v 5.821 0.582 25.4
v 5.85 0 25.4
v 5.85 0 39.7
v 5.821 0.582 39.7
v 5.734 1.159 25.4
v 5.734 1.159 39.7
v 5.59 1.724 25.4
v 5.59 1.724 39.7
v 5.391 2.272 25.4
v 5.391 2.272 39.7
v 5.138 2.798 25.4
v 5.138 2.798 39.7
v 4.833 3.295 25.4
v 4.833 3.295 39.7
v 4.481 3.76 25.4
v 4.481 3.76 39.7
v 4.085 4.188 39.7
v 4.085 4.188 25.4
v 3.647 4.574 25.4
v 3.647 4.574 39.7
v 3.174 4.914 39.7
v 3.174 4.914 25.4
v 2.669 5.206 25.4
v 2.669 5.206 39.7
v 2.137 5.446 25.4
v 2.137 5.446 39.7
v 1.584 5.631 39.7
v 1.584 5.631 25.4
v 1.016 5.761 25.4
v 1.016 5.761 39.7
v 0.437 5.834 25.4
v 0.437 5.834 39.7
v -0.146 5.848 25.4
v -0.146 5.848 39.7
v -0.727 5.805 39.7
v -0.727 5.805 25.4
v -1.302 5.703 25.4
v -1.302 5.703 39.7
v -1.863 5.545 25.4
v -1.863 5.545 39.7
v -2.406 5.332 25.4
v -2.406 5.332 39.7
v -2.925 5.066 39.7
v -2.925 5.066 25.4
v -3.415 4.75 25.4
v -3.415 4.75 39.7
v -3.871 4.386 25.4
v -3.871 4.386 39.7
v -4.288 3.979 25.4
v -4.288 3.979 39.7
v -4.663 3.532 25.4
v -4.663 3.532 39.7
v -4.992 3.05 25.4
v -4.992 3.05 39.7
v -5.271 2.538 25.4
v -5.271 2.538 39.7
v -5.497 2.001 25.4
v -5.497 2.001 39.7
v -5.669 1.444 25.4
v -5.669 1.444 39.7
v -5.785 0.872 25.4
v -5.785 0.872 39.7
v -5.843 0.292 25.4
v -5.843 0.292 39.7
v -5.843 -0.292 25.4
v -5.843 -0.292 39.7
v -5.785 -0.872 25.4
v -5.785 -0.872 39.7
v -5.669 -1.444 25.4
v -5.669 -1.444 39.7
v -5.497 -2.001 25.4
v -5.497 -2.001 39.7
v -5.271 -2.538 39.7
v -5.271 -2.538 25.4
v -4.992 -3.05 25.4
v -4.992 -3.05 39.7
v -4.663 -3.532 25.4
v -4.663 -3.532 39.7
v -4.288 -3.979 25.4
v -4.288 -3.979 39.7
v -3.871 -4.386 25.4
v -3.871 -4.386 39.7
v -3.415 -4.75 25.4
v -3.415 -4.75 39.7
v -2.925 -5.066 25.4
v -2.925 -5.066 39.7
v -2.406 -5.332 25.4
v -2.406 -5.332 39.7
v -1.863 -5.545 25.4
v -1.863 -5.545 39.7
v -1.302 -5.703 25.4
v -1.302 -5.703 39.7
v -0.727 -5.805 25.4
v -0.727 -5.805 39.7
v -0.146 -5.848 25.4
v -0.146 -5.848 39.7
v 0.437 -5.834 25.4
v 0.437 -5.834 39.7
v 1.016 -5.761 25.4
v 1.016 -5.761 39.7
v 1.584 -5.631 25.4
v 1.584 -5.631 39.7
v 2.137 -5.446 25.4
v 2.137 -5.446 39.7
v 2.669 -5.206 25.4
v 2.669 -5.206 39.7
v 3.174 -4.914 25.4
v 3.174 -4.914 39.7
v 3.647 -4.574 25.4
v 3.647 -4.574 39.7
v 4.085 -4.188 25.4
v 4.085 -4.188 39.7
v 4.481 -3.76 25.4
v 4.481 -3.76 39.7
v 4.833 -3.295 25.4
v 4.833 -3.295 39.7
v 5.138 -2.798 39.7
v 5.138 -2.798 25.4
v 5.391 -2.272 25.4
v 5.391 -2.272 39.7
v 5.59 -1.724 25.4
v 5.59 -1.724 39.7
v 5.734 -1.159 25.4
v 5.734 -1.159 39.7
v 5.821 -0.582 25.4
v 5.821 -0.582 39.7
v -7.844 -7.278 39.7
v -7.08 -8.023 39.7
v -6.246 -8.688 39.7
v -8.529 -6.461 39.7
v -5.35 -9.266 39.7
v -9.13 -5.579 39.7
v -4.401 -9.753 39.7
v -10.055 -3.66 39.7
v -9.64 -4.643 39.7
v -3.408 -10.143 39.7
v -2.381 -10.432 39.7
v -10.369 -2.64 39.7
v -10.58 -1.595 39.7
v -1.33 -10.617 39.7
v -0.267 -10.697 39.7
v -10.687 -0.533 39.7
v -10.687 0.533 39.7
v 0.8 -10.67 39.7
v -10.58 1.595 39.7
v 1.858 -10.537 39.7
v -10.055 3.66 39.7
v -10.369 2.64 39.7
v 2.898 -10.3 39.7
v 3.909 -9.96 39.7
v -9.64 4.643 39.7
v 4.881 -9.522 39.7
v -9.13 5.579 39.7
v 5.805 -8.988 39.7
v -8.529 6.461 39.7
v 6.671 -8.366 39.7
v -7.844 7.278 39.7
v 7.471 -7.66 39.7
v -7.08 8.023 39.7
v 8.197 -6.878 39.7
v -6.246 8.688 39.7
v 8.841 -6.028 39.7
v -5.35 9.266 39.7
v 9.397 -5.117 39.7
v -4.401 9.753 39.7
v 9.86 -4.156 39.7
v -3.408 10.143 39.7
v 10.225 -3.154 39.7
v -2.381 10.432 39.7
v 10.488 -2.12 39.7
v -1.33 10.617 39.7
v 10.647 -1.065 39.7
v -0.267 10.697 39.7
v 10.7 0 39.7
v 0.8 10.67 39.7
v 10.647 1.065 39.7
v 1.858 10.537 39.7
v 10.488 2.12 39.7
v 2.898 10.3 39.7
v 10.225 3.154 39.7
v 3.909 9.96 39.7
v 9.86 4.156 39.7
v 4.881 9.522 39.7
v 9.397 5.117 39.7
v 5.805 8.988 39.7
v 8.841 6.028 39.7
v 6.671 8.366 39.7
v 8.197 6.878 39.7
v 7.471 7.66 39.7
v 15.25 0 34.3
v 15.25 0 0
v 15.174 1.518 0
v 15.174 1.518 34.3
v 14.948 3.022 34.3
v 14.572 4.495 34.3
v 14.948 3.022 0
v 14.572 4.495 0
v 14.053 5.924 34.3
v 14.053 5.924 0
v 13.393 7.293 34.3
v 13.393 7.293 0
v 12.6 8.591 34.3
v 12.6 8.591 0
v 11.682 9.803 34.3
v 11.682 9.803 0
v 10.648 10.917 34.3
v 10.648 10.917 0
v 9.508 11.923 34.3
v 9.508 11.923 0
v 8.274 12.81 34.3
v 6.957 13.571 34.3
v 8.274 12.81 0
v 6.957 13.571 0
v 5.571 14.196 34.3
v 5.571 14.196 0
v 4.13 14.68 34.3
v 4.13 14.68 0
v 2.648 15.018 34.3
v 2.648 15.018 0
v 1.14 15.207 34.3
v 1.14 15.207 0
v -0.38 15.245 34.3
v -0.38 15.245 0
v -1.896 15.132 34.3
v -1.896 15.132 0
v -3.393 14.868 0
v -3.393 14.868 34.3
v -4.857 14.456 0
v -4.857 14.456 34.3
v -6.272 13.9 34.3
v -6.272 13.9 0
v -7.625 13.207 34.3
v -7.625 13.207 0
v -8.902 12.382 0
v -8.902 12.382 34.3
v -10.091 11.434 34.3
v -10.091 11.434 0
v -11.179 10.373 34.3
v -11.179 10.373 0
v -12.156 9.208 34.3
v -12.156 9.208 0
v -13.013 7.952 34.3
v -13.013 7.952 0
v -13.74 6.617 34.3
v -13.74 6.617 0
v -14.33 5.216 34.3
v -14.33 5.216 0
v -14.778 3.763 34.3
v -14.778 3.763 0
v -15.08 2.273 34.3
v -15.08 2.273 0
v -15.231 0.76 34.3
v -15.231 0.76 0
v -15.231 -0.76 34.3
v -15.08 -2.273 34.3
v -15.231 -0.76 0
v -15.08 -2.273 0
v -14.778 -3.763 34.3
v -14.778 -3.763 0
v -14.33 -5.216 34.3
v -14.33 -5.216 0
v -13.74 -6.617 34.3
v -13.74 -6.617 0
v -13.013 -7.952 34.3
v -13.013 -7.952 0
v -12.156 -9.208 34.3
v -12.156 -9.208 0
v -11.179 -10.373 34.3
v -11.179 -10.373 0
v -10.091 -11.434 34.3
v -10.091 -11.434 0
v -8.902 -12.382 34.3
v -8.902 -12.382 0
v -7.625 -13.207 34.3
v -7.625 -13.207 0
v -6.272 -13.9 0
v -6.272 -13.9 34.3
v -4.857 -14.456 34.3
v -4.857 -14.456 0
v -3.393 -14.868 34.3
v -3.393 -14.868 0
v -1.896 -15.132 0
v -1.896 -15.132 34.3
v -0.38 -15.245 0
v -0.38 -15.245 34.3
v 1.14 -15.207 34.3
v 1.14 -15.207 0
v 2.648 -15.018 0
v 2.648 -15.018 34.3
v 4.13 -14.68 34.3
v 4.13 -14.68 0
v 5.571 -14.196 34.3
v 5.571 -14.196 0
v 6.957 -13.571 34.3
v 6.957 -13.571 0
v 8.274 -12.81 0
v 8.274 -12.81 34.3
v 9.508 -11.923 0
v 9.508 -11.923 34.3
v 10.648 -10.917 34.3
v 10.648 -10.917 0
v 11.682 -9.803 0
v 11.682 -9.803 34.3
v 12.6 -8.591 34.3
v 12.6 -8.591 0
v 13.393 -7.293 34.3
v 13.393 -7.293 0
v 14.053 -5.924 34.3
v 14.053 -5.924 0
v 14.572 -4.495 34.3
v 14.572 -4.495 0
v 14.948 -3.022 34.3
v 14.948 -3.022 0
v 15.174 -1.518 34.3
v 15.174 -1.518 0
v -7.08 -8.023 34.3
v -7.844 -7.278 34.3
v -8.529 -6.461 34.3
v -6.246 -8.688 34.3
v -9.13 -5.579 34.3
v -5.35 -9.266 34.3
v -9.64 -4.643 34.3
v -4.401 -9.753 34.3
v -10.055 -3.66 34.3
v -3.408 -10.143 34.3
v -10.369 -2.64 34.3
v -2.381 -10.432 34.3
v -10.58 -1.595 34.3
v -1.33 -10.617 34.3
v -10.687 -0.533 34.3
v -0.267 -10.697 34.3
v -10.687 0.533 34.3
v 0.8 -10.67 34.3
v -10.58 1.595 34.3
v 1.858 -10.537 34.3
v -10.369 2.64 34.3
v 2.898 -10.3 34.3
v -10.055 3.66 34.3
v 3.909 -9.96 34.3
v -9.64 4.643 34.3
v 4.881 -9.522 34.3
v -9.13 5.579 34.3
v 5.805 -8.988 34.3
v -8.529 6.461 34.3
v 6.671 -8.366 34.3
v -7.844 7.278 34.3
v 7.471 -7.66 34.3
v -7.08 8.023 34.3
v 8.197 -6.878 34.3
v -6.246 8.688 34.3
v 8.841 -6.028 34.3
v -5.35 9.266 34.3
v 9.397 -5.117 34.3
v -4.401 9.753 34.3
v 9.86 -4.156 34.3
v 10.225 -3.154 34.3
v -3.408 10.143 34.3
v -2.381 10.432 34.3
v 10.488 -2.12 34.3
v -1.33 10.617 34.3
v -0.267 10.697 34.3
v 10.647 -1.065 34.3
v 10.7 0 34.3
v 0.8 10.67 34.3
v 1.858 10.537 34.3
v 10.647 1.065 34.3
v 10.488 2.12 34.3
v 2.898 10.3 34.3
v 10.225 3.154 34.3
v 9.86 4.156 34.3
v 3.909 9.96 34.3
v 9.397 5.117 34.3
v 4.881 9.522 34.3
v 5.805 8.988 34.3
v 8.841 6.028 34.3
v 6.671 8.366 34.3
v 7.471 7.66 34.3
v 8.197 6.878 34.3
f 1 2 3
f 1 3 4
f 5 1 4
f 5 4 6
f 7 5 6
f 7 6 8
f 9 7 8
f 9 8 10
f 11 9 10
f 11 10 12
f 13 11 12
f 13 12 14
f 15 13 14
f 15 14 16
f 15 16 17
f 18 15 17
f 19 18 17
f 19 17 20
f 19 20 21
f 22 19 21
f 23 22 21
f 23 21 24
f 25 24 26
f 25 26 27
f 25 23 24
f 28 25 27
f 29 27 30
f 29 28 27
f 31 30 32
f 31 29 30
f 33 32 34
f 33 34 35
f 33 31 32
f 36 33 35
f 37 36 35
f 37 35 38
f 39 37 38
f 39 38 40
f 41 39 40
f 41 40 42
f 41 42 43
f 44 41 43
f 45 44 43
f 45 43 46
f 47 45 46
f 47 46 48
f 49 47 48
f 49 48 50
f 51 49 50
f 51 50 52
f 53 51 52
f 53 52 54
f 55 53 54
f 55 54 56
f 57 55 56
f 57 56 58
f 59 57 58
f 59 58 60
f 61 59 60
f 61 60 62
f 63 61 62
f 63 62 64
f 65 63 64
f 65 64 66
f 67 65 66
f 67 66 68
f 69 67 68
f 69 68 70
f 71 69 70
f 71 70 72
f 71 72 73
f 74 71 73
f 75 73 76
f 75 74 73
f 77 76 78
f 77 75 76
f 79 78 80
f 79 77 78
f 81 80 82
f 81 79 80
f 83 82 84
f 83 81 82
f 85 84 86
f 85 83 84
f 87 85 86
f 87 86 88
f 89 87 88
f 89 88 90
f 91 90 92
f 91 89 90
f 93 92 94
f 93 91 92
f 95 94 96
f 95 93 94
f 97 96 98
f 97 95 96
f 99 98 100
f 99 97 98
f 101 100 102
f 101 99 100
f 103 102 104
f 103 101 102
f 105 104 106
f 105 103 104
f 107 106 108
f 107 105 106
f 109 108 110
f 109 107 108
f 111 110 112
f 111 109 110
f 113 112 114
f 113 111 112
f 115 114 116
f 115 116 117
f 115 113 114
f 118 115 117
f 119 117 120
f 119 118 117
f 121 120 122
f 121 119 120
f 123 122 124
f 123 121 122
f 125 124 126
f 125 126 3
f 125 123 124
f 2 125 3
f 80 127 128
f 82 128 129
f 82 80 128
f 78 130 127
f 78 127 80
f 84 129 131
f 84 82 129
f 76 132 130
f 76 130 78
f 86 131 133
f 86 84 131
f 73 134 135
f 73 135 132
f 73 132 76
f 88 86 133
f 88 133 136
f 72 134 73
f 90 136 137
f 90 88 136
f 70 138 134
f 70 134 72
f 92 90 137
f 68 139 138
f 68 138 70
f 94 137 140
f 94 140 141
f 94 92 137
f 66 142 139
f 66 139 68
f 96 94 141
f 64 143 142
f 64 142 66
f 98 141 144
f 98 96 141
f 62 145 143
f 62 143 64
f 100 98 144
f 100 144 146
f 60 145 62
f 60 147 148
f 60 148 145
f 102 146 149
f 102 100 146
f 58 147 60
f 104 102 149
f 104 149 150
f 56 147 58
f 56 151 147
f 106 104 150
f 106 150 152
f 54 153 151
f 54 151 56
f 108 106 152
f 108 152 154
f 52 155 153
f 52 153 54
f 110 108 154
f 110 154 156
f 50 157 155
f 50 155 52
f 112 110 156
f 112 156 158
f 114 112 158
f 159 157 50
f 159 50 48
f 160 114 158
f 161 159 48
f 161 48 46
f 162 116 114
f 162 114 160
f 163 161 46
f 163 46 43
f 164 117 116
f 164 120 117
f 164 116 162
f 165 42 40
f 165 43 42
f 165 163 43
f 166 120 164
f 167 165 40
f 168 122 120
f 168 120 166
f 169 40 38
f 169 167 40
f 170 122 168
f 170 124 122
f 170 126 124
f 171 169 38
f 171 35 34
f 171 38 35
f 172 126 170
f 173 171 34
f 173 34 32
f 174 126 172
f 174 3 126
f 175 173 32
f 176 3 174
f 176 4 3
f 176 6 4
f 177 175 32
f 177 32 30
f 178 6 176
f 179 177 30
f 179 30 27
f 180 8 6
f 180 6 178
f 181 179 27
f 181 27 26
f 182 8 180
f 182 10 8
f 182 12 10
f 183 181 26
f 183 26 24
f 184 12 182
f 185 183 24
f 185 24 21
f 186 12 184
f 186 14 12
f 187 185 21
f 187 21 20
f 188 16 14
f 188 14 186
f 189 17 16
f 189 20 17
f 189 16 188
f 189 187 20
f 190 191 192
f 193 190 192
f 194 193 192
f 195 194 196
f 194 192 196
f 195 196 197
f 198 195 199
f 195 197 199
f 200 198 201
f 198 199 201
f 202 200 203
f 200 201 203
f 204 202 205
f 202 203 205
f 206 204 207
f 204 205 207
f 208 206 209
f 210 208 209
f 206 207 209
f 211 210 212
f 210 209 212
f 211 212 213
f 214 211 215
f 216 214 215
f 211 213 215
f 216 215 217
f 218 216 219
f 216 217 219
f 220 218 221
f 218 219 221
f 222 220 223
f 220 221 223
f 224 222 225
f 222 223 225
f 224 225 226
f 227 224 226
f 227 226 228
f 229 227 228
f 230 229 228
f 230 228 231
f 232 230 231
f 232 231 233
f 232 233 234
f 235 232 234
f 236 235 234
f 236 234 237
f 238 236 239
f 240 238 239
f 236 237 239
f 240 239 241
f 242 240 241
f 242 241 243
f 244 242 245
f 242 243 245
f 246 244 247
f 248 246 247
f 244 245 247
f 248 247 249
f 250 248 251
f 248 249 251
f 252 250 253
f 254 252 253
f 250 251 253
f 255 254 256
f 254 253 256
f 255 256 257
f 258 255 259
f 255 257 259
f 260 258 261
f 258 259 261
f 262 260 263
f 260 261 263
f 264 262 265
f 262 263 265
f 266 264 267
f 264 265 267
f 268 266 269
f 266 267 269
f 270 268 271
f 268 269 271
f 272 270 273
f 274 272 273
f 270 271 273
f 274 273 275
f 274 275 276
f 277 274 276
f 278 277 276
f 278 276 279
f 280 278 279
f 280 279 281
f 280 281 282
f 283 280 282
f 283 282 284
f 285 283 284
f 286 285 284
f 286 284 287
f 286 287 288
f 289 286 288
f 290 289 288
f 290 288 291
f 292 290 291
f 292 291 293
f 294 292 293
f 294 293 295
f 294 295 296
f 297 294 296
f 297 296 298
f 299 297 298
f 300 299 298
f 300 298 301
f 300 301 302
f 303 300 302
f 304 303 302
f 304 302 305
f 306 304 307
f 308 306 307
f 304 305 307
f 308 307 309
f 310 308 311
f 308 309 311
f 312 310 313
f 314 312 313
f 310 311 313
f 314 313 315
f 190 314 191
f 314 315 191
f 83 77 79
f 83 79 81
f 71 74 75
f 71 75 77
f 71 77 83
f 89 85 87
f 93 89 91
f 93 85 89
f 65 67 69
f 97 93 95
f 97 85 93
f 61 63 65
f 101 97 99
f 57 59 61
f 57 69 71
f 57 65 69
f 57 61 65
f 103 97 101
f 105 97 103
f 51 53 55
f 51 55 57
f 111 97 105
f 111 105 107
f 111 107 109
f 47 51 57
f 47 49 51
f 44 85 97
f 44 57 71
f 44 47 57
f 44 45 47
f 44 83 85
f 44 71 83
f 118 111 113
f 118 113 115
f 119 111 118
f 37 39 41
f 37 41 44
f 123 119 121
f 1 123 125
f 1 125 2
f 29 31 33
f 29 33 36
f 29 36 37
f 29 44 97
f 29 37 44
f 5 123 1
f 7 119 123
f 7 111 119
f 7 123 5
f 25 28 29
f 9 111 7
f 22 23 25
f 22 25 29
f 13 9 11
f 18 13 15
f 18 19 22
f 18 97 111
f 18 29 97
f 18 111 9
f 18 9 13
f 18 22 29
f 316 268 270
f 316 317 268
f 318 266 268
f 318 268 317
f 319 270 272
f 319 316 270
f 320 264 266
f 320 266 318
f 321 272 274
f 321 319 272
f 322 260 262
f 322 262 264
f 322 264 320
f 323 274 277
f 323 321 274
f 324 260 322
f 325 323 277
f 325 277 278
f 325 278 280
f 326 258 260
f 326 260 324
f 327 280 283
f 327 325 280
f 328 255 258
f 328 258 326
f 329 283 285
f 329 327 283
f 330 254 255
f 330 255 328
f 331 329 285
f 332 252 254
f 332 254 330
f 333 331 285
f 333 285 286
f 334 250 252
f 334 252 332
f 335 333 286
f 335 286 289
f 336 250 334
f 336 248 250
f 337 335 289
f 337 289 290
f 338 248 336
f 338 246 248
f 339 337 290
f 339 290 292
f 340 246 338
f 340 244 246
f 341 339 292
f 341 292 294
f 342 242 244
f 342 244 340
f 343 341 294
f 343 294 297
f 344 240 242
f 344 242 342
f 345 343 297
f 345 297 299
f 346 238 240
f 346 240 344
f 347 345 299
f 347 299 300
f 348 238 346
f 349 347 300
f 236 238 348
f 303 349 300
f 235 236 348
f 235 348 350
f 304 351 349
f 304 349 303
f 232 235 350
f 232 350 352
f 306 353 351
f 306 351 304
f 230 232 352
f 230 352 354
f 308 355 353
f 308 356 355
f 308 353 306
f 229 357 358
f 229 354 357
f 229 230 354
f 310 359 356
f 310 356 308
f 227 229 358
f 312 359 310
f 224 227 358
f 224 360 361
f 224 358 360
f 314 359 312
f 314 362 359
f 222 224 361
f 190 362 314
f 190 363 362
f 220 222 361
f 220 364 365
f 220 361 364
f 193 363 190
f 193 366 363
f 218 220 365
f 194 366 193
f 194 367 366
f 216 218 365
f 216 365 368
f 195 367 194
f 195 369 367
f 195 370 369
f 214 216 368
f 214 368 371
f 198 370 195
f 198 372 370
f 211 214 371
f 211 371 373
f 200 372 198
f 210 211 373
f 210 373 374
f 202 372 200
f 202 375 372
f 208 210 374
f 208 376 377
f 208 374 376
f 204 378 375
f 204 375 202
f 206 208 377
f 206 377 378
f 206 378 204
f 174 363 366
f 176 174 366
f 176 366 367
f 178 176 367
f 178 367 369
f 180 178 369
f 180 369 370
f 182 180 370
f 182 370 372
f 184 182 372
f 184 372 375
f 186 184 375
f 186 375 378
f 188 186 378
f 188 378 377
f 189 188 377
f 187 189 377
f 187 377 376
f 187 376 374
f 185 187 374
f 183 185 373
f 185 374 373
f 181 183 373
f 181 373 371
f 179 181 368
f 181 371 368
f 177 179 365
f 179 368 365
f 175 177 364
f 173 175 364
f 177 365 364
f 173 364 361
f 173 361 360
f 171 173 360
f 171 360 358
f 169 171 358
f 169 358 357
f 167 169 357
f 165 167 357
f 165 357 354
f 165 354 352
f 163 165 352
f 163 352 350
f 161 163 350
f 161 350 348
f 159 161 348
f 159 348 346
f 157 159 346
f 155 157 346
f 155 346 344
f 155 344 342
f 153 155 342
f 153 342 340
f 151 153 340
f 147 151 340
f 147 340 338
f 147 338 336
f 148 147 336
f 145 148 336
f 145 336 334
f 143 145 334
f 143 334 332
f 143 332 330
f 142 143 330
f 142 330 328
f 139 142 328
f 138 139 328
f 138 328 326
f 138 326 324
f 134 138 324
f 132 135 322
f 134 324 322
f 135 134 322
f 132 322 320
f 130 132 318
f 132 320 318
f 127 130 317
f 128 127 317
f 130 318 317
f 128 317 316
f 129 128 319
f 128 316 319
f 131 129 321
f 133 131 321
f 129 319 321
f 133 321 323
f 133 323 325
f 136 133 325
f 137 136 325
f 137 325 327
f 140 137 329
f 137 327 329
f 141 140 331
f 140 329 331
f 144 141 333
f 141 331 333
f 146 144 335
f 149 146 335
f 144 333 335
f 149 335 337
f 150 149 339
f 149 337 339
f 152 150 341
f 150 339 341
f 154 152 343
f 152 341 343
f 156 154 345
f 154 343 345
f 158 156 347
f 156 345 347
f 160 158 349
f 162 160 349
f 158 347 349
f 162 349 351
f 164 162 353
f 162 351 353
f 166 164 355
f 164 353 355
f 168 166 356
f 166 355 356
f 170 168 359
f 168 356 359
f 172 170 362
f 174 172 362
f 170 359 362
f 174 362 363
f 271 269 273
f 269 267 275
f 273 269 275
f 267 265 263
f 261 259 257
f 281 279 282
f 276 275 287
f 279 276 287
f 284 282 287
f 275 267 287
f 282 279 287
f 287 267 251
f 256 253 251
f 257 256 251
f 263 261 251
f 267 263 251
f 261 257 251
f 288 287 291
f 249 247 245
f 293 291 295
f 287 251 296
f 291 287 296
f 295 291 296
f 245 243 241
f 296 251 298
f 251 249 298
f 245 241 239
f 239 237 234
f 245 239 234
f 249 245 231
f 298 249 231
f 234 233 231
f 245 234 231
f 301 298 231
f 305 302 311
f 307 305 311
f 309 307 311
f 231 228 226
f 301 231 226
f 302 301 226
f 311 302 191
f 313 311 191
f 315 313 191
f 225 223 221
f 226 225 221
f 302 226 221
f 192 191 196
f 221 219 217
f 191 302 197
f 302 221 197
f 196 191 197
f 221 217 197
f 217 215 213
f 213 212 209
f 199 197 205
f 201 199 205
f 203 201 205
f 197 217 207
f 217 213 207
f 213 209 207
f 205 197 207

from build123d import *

# Parameters (mm, degrees)
F0_R     = 15.25
F0_R_2   = 10.7
F1_DEPTH = 34.3
F0_R_3   = 5.85
F2_DEPTH = 39.7
F3_DEPTH = 25.4


with BuildPart() as f1:
    # F0 (on Top) → F1 (new body)
    with BuildSketch(Plane.XY):
        Circle(F0_R)
        Circle(F0_R_2, mode=Mode.SUBTRACT)
    extrude(amount=F1_DEPTH)

    # F0 (on Top) → F2 (join)
    with BuildSketch(Plane.XY):
        Circle(F0_R_2)
        Circle(F0_R_3, mode=Mode.SUBTRACT)
    extrude(amount=F2_DEPTH)

    # F0 (on Top) → F3 (join)
    with BuildSketch(Plane.XY):
        Circle(F0_R_3)
    extrude(amount=F3_DEPTH)


solid = f1.part
